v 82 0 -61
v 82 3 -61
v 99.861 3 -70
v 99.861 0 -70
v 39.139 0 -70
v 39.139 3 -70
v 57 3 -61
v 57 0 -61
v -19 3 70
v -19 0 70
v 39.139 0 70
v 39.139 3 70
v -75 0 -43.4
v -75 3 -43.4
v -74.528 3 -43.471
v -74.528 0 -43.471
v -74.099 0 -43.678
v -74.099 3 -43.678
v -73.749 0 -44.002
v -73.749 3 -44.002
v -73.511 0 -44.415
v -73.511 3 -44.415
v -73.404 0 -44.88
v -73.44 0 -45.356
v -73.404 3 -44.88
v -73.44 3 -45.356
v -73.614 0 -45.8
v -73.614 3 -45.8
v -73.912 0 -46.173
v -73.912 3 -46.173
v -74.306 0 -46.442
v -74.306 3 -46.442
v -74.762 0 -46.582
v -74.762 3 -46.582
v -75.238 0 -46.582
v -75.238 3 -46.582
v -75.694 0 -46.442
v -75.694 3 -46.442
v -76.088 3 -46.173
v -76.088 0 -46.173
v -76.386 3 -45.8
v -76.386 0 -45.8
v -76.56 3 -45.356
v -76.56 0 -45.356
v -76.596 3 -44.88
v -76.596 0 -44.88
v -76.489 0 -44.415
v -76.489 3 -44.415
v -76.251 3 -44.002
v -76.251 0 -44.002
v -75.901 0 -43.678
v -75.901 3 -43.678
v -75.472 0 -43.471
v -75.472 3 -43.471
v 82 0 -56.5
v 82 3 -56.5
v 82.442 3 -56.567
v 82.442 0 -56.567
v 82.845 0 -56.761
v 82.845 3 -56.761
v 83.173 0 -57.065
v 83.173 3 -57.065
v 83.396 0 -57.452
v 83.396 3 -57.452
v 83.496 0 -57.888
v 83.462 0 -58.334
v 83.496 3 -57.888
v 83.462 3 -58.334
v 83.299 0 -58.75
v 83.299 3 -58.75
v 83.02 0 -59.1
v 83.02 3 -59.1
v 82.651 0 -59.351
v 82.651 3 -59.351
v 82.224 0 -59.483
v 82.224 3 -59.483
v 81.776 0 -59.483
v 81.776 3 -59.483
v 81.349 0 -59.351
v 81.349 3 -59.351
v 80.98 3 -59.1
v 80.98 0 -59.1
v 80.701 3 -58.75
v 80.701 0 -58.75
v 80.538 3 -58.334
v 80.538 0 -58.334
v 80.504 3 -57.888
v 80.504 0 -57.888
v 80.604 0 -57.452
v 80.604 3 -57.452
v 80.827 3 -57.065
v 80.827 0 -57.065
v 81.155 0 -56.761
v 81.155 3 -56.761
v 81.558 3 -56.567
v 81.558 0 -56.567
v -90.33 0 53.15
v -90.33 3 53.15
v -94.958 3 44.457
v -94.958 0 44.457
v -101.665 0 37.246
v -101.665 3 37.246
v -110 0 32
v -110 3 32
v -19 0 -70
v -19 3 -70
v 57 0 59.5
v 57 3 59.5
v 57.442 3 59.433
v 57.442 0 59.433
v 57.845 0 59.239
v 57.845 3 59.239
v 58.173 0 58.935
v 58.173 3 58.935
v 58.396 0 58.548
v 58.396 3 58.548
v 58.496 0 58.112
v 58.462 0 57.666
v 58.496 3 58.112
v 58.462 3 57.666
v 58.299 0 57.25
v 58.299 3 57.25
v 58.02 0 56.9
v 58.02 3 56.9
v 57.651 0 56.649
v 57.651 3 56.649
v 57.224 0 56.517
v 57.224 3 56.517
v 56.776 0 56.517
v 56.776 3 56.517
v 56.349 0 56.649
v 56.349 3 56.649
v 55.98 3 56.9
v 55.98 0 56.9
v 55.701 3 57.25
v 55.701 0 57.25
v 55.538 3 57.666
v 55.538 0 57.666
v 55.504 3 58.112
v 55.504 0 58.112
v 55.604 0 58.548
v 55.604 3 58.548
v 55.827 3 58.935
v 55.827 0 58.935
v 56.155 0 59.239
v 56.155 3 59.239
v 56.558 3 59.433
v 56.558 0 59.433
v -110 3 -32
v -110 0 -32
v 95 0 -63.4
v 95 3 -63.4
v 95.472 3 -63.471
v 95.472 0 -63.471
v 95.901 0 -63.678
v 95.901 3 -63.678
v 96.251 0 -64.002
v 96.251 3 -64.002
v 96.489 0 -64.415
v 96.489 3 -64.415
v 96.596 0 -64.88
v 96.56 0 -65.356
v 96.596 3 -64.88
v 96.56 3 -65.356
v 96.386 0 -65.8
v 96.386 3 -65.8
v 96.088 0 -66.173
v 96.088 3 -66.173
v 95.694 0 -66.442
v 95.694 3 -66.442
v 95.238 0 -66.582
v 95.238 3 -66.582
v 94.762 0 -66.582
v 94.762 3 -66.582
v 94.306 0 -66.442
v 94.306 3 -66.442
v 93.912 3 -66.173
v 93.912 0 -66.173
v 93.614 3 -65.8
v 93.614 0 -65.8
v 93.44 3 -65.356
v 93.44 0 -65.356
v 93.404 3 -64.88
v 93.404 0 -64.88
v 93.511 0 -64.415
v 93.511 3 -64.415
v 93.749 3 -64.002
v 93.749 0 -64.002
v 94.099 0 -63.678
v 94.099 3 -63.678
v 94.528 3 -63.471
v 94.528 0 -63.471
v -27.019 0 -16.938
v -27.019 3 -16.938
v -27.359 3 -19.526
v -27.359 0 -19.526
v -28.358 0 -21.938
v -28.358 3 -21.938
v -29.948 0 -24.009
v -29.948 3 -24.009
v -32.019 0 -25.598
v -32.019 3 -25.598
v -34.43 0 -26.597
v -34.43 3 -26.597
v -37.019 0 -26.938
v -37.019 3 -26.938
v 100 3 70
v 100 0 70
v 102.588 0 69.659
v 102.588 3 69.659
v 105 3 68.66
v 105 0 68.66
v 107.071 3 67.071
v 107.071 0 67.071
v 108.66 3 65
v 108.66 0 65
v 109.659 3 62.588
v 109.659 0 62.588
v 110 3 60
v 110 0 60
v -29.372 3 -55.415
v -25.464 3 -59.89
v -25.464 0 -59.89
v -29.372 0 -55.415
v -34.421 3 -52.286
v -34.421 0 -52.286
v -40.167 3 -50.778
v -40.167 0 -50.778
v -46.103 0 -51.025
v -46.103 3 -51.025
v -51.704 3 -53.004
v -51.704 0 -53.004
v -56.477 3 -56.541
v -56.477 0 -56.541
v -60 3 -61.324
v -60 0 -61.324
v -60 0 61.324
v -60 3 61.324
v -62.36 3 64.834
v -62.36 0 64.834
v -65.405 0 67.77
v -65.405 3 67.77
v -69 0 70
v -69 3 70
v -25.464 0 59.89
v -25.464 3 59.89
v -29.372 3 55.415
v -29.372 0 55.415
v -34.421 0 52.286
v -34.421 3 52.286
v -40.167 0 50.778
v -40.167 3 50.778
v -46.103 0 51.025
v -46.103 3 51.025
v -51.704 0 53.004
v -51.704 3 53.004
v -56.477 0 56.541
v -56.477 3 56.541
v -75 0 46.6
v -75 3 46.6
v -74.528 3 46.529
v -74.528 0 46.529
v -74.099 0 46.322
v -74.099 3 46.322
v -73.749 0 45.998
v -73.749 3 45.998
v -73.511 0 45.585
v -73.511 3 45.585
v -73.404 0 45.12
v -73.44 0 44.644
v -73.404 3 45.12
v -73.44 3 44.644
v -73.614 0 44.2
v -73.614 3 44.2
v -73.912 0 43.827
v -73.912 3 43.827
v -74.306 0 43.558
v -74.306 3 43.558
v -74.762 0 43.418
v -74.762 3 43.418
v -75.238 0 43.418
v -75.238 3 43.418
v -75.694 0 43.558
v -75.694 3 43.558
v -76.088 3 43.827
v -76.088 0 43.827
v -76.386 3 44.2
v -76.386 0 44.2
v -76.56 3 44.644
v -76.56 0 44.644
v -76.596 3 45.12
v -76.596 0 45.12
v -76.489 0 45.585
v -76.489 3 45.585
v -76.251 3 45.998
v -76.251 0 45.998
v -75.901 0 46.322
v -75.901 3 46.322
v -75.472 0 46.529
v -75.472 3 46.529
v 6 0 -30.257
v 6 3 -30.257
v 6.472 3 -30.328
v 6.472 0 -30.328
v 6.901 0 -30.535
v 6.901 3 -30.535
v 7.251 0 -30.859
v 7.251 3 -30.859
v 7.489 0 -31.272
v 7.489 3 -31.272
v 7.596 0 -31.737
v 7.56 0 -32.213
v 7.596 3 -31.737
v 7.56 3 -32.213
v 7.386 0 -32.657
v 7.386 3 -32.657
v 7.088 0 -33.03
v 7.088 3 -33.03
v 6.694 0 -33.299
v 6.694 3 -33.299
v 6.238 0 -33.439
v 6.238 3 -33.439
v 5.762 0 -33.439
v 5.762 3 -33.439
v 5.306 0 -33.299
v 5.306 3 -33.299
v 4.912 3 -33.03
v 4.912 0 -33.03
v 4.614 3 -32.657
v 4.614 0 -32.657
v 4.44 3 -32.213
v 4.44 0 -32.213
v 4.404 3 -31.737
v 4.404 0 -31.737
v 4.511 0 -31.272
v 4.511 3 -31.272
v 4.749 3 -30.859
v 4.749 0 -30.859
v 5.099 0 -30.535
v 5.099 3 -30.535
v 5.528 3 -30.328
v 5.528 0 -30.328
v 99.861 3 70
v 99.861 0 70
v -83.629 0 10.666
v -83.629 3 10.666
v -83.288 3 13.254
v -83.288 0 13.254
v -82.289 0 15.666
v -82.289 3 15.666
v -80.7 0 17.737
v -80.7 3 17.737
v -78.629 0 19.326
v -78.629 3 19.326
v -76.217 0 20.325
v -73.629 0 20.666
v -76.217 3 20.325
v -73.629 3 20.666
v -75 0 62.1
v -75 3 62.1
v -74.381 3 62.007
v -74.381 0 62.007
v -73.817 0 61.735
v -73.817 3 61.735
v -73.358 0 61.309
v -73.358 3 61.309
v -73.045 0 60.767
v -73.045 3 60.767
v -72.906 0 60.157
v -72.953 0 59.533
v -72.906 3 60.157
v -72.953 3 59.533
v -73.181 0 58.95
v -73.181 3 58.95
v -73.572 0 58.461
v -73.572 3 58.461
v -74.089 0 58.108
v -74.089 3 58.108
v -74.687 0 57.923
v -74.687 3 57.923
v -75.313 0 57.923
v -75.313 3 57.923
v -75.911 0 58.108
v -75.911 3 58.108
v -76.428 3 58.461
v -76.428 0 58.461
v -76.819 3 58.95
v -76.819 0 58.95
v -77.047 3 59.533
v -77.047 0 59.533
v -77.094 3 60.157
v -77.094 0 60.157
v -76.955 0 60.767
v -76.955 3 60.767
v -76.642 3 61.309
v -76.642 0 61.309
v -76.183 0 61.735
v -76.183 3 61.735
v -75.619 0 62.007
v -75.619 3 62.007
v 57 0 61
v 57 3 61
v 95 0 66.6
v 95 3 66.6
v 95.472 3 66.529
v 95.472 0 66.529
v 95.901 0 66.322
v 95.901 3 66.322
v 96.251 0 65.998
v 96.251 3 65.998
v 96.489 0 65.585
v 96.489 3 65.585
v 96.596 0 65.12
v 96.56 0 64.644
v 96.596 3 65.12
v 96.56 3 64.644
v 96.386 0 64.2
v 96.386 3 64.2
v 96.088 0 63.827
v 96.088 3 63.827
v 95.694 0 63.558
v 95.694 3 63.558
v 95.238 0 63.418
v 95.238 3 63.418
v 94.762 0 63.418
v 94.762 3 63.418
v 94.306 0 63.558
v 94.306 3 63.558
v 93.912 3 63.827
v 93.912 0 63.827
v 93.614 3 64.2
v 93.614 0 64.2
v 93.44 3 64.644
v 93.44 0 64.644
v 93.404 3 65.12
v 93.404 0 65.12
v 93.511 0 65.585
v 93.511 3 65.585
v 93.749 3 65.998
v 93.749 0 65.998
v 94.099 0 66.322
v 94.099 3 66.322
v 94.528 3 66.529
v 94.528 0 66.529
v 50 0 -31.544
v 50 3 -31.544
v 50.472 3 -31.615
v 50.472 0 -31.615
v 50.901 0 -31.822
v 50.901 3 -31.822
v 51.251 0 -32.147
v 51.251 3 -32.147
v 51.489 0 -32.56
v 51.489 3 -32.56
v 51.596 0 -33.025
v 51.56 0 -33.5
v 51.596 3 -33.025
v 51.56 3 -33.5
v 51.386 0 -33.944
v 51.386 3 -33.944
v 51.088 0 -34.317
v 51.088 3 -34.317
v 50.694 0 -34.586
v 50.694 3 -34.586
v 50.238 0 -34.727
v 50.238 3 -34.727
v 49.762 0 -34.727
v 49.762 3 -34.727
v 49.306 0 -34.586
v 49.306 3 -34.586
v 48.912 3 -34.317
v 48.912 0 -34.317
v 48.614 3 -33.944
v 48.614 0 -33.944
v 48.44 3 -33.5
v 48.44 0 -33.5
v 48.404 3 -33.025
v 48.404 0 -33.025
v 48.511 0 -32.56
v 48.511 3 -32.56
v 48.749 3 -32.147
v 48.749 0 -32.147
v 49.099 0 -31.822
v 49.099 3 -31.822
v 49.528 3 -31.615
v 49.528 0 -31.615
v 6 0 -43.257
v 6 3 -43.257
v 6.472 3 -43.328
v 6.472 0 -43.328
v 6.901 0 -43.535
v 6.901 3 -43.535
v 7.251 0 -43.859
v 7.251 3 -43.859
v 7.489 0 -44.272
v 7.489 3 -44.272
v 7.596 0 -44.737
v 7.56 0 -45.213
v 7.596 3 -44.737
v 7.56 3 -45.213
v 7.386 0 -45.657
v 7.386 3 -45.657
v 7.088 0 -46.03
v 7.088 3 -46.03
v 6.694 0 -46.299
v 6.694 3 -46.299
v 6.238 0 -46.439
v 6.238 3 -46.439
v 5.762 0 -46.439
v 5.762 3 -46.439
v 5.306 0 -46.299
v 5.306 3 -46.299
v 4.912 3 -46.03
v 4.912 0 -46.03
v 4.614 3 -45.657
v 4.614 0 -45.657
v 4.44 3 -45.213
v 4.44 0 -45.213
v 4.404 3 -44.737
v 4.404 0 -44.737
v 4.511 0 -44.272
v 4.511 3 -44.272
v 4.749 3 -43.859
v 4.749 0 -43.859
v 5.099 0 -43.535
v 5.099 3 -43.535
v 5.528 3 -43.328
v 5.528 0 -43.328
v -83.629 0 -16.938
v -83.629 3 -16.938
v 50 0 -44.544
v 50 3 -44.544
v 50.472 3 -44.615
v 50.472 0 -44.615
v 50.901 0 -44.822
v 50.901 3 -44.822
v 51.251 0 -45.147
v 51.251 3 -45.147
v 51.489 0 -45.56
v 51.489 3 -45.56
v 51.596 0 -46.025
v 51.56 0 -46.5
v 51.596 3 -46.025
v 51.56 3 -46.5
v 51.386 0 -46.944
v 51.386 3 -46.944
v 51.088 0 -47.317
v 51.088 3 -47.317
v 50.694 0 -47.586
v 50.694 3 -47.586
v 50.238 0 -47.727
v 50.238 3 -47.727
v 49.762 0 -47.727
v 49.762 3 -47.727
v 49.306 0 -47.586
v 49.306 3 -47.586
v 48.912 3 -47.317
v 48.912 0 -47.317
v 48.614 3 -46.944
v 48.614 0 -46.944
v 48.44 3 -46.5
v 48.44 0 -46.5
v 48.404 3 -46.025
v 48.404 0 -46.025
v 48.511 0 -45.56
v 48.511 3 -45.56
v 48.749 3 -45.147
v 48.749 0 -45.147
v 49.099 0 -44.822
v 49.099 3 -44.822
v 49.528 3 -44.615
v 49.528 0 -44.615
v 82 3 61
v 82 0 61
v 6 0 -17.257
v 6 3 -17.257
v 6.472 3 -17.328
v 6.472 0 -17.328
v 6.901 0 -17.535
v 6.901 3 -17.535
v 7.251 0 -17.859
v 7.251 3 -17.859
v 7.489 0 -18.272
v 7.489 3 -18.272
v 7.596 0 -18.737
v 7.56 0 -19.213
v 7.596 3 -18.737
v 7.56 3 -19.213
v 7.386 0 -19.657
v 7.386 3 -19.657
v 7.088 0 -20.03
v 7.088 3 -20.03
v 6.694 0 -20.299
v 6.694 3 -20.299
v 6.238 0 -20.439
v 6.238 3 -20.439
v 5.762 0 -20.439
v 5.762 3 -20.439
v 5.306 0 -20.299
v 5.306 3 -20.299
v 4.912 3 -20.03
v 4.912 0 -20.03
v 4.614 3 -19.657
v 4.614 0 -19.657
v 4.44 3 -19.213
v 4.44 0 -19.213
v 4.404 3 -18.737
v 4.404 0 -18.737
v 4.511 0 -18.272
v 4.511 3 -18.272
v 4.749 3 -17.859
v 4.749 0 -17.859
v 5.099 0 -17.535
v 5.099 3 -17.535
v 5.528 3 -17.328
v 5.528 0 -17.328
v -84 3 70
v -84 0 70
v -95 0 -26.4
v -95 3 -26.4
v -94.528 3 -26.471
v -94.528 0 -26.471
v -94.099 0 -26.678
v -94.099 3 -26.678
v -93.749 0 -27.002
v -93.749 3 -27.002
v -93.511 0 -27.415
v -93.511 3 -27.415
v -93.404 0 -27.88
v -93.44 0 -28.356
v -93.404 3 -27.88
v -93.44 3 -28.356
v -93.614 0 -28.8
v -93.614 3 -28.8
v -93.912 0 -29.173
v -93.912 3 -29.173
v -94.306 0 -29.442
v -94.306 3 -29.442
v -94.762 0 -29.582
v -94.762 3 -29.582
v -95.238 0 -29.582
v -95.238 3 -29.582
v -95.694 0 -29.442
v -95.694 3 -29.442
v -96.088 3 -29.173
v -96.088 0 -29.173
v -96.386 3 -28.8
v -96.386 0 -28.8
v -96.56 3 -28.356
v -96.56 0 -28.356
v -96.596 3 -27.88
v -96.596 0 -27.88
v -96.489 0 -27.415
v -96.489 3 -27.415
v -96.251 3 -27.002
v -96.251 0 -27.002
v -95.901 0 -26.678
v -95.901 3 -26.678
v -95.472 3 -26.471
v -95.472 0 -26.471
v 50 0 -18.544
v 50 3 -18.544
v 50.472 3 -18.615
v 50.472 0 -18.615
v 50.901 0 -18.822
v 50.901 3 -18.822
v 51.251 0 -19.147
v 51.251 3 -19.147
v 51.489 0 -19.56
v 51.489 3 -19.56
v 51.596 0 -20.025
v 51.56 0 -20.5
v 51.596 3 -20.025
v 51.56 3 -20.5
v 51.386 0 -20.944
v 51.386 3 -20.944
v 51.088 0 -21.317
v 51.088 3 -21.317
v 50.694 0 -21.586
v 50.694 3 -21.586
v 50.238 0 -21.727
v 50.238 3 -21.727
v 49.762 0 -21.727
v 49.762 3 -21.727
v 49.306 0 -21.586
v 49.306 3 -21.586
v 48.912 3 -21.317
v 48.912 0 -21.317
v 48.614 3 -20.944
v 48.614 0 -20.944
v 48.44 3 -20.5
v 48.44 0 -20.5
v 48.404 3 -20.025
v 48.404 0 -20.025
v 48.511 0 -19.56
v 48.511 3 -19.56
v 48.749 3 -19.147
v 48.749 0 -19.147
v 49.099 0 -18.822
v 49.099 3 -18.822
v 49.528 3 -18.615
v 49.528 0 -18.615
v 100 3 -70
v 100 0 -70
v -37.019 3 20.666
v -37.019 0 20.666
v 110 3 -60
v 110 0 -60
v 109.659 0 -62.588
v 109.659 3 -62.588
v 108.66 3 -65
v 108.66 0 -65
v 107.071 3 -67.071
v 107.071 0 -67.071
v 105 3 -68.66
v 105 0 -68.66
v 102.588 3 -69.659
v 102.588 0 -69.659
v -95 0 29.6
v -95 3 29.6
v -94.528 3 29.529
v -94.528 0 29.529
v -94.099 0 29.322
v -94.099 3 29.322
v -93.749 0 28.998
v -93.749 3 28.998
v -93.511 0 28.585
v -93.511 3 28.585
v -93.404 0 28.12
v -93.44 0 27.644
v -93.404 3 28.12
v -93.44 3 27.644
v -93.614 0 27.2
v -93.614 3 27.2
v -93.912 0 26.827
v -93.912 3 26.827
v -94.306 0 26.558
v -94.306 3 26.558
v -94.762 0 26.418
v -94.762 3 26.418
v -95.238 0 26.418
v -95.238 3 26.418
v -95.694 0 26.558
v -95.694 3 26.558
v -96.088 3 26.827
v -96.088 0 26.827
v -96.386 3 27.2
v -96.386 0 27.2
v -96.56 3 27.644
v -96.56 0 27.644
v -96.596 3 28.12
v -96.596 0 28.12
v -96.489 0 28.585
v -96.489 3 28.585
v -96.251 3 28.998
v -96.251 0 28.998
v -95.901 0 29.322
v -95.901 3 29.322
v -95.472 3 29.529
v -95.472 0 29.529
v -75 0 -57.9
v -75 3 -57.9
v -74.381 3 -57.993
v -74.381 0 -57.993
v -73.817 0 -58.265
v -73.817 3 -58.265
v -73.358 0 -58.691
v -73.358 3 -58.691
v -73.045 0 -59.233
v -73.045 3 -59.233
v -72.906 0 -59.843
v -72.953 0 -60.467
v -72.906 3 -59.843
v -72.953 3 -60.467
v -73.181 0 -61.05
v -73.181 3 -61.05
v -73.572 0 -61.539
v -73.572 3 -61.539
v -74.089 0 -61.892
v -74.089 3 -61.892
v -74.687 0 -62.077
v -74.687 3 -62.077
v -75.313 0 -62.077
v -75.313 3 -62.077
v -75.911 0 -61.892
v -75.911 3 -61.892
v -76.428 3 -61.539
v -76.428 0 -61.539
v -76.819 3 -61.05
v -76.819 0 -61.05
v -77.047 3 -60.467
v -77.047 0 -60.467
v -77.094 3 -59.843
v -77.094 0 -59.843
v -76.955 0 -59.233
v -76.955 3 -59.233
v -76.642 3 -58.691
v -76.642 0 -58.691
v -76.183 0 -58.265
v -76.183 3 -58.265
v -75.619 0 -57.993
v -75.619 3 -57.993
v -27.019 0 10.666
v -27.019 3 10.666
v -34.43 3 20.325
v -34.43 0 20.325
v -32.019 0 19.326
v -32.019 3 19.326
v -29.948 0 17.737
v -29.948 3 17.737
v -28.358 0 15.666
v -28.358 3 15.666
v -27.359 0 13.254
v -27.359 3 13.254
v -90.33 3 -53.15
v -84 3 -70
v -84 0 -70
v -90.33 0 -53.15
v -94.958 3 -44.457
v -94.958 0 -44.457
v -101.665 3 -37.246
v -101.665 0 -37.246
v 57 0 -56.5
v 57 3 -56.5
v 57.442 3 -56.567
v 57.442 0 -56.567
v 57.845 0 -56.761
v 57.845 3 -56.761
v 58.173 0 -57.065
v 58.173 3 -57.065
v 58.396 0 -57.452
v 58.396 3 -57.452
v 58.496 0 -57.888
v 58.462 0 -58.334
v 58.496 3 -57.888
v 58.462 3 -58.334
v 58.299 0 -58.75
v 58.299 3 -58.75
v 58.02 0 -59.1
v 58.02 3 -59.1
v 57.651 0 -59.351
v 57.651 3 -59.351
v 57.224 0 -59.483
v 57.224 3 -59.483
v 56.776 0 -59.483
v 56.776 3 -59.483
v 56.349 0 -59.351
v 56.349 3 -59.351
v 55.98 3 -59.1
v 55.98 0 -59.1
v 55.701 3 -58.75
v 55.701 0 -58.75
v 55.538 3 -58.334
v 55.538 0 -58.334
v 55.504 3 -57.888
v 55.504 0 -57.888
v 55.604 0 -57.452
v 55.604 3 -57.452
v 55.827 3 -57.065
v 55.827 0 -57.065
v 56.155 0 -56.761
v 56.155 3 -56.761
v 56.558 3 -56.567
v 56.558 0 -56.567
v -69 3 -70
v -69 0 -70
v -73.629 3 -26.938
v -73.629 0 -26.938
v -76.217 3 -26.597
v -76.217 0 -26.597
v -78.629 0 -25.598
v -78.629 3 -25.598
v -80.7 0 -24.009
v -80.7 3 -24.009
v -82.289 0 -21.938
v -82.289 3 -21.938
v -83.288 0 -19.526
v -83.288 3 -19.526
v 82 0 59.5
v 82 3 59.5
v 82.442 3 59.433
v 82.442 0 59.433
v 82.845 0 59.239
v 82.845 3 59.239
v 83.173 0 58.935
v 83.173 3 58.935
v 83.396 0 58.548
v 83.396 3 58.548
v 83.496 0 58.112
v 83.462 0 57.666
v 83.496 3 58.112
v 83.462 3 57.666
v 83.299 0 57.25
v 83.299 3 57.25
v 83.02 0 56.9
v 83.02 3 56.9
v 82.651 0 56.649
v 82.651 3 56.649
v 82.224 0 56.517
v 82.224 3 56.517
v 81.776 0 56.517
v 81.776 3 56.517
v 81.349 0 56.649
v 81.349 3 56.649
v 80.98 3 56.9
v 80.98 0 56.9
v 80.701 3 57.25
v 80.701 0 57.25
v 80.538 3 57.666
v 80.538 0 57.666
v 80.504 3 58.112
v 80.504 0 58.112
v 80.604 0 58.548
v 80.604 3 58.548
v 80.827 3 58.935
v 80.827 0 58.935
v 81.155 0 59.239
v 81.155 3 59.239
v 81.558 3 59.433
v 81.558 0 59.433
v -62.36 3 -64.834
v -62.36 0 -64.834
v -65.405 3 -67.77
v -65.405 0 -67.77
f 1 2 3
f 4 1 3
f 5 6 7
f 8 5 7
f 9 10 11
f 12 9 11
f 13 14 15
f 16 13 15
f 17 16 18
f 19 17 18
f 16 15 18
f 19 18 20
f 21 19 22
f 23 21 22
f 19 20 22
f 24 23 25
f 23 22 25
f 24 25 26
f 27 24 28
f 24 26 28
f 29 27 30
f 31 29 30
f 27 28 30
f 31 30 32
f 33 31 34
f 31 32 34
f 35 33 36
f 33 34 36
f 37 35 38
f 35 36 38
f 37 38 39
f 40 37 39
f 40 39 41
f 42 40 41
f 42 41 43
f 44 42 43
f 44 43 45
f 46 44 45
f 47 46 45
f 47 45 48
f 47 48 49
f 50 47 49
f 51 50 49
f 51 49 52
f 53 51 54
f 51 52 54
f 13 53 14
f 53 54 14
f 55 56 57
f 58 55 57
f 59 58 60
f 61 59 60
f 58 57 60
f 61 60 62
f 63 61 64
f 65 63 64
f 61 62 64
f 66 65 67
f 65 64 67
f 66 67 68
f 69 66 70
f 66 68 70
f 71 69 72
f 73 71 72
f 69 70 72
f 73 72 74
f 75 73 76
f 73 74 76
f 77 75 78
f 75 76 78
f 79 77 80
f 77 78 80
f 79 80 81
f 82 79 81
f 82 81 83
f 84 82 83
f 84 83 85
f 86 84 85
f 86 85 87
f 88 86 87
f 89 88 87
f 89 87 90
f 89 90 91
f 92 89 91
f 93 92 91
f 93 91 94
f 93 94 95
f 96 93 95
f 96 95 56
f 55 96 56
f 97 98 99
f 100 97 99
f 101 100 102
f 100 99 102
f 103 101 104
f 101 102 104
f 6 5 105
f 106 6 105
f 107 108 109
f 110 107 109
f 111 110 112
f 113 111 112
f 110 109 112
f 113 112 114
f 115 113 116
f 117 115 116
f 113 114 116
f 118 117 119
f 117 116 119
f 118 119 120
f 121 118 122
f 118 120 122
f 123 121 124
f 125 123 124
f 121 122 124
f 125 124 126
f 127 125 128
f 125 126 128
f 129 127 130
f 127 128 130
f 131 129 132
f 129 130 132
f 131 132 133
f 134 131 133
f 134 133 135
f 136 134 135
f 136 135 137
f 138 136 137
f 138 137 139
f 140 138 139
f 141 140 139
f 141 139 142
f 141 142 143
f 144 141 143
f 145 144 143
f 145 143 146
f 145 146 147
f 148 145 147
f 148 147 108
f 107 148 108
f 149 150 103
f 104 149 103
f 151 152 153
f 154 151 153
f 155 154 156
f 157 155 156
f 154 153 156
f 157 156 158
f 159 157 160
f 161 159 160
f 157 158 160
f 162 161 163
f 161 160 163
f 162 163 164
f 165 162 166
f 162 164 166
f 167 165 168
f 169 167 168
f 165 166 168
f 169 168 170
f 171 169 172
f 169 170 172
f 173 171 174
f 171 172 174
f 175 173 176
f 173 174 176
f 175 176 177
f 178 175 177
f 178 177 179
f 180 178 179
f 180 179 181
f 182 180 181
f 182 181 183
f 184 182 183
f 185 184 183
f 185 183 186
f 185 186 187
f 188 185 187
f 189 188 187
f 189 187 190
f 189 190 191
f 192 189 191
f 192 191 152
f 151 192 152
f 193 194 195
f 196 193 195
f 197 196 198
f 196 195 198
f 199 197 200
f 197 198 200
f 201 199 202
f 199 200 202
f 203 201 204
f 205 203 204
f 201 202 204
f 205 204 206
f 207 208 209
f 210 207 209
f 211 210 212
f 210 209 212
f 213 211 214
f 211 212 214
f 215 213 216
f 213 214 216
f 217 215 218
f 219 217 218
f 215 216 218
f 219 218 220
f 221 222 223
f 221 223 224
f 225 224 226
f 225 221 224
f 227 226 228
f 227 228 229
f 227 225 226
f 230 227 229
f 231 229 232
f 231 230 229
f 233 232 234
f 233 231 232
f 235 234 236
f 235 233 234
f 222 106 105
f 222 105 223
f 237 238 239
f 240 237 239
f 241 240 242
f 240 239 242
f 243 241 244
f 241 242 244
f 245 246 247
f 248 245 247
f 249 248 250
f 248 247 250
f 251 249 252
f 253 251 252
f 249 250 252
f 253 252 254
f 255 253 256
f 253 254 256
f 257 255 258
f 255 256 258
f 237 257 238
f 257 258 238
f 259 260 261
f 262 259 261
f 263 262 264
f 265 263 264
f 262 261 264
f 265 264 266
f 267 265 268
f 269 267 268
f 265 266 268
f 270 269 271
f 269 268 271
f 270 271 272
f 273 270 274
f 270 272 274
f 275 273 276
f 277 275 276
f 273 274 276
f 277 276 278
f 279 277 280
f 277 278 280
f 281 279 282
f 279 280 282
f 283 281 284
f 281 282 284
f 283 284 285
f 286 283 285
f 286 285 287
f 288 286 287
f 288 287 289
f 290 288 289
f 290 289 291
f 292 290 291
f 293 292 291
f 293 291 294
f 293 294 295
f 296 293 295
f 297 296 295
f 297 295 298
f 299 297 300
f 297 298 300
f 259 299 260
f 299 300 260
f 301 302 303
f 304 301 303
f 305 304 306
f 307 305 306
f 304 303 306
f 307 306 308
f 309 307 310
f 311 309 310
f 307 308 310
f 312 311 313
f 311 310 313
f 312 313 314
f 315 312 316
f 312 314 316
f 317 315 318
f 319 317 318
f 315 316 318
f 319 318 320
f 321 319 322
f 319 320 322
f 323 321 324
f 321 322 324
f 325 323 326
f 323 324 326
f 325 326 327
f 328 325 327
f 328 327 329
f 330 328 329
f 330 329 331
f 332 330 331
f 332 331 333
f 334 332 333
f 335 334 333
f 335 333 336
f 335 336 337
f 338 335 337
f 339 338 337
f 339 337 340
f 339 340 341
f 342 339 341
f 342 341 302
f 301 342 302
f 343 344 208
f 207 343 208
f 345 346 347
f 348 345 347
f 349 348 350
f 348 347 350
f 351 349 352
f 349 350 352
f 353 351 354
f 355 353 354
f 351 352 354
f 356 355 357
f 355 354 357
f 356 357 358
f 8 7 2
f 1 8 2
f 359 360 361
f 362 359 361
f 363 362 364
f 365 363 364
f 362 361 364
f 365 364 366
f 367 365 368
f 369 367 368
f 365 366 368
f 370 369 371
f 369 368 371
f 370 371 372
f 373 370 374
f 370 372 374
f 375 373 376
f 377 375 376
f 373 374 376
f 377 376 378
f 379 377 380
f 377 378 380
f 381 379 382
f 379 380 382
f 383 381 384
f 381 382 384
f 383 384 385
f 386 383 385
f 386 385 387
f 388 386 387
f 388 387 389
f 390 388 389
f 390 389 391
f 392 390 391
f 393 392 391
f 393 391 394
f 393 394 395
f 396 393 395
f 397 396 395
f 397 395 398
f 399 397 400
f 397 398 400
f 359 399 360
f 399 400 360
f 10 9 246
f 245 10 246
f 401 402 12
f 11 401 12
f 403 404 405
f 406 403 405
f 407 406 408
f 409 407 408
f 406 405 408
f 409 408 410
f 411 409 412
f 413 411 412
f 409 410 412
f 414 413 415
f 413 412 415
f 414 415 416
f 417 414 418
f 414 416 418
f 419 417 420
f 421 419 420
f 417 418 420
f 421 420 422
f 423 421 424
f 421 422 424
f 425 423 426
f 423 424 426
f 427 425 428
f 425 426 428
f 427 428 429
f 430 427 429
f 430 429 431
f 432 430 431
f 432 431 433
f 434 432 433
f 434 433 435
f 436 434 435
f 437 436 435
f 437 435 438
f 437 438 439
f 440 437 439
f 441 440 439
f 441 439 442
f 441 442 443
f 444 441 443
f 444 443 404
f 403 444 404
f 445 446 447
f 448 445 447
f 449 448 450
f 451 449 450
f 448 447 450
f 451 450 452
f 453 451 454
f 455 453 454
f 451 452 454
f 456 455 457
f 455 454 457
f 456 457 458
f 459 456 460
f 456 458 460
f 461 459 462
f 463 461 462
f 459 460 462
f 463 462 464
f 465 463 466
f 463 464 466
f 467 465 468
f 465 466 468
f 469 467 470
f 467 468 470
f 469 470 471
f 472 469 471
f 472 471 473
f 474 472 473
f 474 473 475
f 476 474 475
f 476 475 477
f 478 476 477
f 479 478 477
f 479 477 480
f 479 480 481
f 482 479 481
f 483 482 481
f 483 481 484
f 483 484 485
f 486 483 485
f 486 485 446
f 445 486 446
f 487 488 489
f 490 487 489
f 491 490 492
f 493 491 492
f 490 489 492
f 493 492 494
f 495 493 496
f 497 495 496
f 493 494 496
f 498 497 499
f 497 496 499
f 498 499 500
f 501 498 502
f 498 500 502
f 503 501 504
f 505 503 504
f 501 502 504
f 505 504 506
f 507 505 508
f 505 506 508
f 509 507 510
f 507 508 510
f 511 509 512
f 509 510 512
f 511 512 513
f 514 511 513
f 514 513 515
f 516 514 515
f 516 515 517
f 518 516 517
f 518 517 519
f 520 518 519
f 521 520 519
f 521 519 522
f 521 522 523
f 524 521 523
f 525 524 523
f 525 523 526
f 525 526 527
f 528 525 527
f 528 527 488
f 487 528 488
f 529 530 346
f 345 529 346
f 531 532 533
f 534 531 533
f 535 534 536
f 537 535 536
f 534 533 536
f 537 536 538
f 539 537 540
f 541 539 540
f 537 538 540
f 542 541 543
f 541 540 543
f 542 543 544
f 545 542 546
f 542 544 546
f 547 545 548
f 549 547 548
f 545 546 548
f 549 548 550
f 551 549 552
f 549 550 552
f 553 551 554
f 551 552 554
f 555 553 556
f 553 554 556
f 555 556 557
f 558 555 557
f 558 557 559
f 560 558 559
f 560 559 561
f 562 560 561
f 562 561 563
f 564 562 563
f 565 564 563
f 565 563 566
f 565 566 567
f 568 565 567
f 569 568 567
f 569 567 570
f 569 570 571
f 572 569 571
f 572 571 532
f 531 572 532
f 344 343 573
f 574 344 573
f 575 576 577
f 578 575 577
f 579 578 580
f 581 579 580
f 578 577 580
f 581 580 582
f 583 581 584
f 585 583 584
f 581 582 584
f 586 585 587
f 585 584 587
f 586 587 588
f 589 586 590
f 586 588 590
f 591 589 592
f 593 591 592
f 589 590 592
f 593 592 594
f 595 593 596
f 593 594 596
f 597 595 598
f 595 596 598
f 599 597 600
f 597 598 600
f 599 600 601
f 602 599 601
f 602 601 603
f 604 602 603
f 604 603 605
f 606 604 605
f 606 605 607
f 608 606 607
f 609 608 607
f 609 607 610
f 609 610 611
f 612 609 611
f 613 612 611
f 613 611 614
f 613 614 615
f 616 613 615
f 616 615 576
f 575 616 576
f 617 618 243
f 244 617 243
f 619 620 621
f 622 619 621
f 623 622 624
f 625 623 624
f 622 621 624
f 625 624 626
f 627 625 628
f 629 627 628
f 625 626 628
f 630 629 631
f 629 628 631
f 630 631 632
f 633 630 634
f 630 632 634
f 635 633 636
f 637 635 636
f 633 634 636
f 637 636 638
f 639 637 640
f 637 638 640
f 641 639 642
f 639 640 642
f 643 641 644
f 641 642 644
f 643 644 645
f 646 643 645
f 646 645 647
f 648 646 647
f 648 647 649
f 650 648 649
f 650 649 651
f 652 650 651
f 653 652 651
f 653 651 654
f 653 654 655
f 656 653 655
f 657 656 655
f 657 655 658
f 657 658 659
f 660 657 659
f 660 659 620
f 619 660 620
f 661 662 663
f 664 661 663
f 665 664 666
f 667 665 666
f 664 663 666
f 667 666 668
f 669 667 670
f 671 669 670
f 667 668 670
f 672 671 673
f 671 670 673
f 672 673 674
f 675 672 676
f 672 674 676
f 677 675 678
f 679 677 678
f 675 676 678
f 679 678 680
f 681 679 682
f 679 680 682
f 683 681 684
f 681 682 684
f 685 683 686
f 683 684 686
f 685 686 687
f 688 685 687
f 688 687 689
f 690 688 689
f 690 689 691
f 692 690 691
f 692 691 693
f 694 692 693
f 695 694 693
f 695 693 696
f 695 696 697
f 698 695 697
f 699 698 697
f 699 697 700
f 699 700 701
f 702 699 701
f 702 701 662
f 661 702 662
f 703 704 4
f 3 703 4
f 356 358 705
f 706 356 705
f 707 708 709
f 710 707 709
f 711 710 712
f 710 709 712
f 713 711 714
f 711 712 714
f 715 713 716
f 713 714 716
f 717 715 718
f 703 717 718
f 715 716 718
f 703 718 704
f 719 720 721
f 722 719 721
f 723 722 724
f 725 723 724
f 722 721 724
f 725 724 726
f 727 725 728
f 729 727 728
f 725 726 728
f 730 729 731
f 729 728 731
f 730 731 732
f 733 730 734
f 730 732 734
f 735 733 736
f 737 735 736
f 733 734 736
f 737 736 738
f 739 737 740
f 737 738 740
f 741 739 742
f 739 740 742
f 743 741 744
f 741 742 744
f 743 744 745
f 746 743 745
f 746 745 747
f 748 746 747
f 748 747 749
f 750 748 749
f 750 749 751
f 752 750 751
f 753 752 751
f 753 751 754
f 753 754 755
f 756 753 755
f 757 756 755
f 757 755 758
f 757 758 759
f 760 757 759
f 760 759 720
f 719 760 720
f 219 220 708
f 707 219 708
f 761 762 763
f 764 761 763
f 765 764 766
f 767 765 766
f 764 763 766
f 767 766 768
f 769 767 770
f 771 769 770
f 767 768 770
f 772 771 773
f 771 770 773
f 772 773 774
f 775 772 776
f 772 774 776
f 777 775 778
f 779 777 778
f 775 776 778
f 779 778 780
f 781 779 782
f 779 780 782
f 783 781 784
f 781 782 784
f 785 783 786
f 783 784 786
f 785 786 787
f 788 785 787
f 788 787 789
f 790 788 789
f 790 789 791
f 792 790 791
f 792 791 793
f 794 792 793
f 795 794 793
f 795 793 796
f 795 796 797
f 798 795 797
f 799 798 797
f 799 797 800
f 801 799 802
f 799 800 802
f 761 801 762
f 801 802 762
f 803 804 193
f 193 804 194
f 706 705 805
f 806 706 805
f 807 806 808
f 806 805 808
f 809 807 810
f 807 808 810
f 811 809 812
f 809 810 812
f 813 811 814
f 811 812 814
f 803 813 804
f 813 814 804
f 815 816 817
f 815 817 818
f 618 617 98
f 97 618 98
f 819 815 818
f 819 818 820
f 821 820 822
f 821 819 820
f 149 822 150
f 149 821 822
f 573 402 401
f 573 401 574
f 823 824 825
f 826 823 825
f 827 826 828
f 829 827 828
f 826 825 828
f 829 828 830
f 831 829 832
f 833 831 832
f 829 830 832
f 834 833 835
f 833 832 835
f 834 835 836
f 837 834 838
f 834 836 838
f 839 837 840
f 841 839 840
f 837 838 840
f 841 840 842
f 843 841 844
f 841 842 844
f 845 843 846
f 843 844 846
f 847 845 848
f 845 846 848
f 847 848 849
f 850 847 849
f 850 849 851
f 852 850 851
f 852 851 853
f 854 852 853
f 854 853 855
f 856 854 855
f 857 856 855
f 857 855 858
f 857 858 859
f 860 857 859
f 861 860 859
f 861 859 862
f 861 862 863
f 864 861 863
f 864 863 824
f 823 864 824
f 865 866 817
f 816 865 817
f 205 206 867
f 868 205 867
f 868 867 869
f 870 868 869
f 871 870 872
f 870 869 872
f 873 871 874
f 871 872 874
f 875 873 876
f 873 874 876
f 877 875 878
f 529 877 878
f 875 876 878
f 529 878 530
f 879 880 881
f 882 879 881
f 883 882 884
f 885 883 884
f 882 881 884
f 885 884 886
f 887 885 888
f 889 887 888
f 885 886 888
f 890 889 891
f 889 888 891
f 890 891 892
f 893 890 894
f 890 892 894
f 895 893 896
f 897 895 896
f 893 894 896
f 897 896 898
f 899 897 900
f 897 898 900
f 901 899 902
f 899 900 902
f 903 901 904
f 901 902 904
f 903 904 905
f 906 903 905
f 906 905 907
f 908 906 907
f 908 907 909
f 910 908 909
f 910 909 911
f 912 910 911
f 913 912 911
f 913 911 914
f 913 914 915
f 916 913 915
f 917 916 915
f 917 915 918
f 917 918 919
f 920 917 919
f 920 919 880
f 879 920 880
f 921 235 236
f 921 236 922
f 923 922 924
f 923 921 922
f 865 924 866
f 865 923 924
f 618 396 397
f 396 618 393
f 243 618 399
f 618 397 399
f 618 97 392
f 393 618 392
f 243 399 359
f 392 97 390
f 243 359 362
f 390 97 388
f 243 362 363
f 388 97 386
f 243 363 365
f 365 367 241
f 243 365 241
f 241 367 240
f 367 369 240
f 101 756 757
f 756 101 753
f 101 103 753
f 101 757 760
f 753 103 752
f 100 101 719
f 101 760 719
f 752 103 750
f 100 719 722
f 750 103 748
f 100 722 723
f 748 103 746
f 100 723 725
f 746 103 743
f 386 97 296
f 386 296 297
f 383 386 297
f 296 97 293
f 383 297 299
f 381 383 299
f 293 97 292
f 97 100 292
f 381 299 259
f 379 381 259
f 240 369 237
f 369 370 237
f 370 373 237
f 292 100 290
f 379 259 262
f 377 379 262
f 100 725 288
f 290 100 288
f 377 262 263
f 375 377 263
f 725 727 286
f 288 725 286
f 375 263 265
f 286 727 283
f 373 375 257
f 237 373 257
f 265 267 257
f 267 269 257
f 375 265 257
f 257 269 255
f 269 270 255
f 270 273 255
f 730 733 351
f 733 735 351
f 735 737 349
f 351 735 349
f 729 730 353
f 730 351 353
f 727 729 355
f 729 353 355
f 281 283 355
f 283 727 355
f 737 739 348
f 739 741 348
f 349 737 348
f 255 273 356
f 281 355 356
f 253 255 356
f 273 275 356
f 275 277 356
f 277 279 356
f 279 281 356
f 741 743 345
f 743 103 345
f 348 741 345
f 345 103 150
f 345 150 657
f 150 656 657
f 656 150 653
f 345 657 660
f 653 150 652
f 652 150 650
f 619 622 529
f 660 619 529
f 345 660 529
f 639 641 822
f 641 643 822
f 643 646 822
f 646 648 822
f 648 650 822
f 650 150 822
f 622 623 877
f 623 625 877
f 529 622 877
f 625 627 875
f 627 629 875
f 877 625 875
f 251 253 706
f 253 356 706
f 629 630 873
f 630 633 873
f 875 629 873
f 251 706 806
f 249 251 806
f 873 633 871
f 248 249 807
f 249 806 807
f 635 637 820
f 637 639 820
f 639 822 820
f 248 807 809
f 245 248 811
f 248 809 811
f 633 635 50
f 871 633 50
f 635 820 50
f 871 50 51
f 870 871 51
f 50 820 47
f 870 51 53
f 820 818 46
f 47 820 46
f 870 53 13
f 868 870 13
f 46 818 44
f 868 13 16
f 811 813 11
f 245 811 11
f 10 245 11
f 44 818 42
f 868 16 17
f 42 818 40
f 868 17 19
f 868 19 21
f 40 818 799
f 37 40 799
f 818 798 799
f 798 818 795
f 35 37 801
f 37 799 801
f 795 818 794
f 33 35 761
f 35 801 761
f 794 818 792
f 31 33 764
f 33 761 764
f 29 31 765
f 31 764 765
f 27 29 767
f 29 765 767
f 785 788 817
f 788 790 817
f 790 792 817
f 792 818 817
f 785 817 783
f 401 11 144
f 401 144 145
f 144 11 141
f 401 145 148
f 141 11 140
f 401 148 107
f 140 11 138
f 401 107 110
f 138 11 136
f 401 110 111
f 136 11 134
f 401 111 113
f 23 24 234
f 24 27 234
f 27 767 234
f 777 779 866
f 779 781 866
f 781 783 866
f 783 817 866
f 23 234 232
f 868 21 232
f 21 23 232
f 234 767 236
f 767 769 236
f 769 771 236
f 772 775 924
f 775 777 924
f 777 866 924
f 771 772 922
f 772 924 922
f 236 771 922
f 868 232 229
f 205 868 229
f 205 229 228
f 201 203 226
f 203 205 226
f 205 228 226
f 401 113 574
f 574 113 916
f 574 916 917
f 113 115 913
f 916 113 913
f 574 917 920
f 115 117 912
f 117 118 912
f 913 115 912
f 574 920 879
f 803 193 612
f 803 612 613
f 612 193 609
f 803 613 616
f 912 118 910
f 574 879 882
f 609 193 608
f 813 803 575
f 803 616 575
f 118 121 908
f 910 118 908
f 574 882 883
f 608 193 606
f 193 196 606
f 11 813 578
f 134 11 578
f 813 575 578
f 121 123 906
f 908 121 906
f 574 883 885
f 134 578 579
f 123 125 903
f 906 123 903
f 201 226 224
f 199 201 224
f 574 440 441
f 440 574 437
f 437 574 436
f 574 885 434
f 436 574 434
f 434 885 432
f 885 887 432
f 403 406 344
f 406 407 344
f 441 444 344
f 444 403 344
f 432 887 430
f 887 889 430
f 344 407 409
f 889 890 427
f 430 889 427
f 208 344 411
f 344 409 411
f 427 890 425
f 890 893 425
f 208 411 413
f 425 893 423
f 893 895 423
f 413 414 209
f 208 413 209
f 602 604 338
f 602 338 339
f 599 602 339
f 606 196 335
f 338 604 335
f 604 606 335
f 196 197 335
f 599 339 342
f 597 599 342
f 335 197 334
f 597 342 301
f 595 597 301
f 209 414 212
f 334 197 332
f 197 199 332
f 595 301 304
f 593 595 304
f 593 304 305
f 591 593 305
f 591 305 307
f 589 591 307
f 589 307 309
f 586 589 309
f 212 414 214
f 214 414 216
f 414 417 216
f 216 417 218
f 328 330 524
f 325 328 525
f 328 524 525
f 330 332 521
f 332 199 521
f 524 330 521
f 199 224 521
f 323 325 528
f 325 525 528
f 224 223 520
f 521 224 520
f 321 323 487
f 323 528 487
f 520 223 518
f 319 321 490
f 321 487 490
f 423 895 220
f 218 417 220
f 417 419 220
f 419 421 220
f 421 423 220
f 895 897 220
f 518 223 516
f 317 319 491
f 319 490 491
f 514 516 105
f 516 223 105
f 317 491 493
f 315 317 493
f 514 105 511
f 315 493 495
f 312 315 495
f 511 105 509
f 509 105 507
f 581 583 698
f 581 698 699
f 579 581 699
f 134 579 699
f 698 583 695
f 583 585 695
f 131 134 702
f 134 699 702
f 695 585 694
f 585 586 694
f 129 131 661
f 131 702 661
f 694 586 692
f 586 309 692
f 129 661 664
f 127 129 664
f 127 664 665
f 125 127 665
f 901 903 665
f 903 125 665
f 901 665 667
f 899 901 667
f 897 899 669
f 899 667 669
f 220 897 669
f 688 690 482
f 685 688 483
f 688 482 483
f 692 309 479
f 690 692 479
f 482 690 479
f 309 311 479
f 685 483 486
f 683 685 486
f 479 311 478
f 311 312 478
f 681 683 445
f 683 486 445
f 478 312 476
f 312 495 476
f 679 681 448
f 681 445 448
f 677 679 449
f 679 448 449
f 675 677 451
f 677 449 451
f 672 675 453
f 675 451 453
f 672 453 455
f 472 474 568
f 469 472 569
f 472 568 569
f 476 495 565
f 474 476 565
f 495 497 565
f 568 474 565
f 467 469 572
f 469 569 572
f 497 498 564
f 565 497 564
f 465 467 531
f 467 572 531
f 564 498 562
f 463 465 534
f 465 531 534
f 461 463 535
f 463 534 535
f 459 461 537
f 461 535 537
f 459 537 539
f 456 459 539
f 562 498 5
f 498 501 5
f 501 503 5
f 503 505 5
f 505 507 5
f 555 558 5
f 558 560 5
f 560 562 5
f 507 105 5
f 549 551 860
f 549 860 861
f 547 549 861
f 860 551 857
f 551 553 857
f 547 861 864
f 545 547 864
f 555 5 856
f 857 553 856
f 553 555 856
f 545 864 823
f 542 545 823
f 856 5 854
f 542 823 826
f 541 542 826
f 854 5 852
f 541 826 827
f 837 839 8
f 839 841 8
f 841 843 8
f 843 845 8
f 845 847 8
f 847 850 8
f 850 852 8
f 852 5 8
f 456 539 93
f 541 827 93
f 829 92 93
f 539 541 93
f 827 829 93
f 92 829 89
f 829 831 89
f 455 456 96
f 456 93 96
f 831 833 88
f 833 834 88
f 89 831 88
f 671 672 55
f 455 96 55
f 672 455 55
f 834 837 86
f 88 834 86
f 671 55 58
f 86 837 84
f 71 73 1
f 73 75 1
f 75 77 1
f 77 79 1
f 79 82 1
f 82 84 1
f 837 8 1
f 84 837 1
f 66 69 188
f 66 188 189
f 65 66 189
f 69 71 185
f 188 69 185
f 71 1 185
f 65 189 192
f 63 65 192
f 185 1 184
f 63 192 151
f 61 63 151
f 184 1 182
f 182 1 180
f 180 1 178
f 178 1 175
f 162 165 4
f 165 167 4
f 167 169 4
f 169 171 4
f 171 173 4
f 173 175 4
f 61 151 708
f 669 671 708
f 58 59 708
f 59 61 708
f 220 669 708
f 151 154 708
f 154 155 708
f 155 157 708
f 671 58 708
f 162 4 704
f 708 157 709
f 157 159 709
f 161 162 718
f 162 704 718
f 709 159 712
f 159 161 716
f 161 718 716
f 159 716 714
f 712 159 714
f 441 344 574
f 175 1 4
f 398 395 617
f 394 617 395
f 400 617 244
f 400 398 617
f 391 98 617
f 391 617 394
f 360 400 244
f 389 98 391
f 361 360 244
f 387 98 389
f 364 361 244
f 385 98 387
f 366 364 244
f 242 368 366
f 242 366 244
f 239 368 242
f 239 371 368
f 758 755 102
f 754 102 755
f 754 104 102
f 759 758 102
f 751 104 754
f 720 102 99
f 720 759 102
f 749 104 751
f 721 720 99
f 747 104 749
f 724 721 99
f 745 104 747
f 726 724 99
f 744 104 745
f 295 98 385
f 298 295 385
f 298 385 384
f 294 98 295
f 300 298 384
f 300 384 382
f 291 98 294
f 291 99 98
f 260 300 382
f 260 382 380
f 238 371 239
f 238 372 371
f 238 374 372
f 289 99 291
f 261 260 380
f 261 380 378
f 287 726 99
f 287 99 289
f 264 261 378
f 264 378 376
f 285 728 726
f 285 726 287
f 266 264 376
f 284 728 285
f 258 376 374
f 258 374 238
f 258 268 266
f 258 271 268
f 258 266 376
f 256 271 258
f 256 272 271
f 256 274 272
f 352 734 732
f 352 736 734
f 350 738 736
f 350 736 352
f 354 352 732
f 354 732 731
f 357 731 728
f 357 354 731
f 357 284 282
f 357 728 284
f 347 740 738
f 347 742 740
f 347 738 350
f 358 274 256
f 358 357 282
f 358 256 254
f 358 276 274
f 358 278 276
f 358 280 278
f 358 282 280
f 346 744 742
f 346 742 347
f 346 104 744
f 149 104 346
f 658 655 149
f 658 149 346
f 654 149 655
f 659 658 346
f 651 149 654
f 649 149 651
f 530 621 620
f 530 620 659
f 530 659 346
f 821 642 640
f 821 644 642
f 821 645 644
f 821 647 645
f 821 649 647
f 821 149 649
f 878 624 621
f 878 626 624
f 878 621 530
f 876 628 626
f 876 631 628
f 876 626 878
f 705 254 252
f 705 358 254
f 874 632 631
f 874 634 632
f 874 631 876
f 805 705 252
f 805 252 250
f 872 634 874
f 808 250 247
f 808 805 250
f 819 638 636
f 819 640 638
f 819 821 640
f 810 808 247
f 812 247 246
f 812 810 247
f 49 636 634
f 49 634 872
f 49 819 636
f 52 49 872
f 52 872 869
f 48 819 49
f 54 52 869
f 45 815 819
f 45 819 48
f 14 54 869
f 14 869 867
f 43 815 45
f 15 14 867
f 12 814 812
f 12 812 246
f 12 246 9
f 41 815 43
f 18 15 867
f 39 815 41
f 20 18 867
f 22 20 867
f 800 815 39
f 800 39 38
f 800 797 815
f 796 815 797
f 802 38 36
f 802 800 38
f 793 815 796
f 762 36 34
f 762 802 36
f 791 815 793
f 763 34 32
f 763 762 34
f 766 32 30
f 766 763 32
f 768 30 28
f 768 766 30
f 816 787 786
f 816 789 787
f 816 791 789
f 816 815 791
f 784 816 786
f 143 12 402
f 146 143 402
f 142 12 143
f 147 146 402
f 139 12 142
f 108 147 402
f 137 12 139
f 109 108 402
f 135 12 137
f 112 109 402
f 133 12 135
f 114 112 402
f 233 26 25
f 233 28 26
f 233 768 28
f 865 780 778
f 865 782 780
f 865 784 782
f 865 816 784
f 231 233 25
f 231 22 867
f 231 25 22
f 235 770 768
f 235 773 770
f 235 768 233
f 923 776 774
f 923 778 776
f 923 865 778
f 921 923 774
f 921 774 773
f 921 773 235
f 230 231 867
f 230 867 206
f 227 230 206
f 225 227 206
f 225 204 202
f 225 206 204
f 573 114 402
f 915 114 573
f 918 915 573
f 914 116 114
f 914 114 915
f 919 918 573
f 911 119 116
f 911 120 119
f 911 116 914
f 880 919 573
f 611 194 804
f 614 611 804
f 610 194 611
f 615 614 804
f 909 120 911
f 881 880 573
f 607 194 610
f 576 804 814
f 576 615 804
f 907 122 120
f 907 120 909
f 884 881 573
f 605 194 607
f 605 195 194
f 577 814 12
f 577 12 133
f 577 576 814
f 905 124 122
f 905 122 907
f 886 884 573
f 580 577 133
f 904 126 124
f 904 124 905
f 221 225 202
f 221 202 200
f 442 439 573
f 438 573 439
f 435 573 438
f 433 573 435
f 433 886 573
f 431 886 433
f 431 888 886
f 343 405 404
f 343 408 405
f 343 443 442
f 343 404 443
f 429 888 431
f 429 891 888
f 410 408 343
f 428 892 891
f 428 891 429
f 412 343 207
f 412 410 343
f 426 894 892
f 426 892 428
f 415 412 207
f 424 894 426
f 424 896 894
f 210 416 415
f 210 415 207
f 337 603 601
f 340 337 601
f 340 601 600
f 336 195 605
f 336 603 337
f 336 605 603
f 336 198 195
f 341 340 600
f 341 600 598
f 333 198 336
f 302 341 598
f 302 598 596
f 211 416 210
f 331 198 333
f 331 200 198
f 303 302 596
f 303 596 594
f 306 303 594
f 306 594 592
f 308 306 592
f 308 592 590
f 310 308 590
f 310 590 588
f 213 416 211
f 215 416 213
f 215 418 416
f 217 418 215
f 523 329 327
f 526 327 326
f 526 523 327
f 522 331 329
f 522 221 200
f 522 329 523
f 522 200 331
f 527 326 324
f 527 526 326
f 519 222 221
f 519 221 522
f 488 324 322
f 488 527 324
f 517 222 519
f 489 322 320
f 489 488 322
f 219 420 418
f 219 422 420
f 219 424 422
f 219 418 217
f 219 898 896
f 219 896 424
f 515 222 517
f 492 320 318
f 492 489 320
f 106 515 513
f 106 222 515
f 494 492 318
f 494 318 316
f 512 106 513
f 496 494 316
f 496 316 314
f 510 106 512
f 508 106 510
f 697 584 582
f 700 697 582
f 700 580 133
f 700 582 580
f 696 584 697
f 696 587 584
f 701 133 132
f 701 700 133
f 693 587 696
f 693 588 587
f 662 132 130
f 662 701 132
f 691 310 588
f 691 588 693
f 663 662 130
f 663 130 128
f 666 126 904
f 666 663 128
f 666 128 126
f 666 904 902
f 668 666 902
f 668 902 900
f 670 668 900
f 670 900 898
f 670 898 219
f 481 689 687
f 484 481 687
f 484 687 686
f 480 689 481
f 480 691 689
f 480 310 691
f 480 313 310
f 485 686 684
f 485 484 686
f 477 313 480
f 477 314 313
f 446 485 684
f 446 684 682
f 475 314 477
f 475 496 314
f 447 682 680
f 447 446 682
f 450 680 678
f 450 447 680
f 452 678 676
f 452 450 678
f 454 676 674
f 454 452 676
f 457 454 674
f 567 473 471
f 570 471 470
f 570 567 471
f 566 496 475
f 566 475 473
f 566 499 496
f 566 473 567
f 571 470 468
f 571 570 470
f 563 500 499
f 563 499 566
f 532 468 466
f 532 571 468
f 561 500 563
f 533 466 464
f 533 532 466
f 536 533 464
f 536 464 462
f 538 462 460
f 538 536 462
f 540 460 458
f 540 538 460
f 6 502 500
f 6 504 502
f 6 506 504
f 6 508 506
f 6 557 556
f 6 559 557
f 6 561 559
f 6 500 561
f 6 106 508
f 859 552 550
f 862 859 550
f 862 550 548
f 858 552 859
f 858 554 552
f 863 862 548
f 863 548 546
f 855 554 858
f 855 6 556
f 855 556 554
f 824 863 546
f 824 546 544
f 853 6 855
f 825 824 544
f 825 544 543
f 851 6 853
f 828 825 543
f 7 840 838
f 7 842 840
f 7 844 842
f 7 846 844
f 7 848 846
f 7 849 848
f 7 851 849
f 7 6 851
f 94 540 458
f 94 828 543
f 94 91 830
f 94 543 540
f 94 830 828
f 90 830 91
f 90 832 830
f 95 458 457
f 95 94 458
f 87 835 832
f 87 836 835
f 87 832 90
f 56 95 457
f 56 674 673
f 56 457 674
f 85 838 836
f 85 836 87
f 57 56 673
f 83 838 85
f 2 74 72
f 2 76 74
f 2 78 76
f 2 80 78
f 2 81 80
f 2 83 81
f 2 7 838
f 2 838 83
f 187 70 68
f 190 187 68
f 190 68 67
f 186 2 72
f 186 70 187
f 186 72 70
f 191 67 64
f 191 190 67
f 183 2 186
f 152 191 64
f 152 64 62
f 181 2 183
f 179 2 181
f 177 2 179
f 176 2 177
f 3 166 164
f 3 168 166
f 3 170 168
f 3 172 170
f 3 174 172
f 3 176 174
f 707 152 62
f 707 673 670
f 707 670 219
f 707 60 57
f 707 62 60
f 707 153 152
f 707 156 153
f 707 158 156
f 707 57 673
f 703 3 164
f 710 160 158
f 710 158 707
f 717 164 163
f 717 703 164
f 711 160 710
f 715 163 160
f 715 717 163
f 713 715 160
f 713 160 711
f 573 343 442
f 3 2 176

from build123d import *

# Parameters (mm, degrees)
Y_KSEKLIK_EKSTR_ZYON3_DEPTH = 3
KES_EKSTR_ZYON10_DEPTH      = 3
KES_EKSTR_ZYON11_DEPTH      = 3
KES_EKSTR_ZYON14_DEPTH      = 3
KES_EKSTR_ZYON15_DEPTH      = 3
IZIM25_R                    = 1.6
KES_EKSTR_ZYON16_DEPTH      = 10
IZIM33_R                    = 2.1
IZIM33_R_2                  = 1.6
KES_EKSTR_ZYON18_DEPTH      = 3
IZIM34_R                    = 1.6
KES_EKSTR_ZYON19_DEPTH      = 10
KES_EKSTR_ZYON21_DEPTH      = 10
IZIM38_R                    = 1.5
KES_EKSTR_ZYON22_DEPTH      = 10
IZIM39_W                    = 25
IZIM39_H                    = 9
KES_EKSTR_ZYON23_DEPTH      = 10
IZIM40_R                    = 1.6
KES_EKSTR_ZYON24_DEPTH      = 100


with BuildPart() as part:
    # Çizim16 → Yükseklik-Ekstrüzyon3 (new body)
    with BuildSketch(Plane(origin=(0, 0, 0), x_dir=(1, 0, 0), z_dir=(0, 1, 0))):
        with BuildLine():
            Line((-110, -70), (100, -70))
            ThreePointArc((100, -70), (107.071067812, -67.071067812), (110, -60))
            Line((110, -60), (110, 60))
            ThreePointArc((110, 60), (107.071067812, 67.071067812), (100, 70))
            Line((100, 70), (-110, 70))
            Line((-110, 70), (-110, -70))
        make_face()
    extrude(amount=Y_KSEKLIK_EKSTR_ZYON3_DEPTH)

    # Çizim18 → Kes-Ekstrüzyon10 (cut)
    with BuildSketch(Plane(origin=(0, 3, 0), x_dir=(1, 0, 0), z_dir=(0, 1, 0))):
        with BuildLine():
            Line((-19, 70), (-25.463821511, 59.889658192))
            ThreePointArc((-25.463821511, 59.889658192), (-43.144058736, 50.67991016), (-60, 61.323569832))
            ThreePointArc((-60, 61.323569832), (-63.804672609, 66.383043129), (-69, 70))
            Line((-69, 70), (-19, 70))
        make_face()
    extrude(amount=-KES_EKSTR_ZYON10_DEPTH, mode=Mode.SUBTRACT)

    # Çizim19 → Kes-Ekstrüzyon11 (cut)
    with BuildSketch(Plane(origin=(0, 3, 0), x_dir=(1, 0, 0), z_dir=(0, 1, 0))):
        with BuildLine():
            Line((-19, -70), (-25.463821511, -59.889658192))
            ThreePointArc((-25.463821511, -59.889658192), (-43.144058736, -50.67991016), (-60, -61.323569832))
            ThreePointArc((-60, -61.323569832), (-63.804672609, -66.383043129), (-69, -70))
            Line((-69, -70), (-19, -70))
        make_face()
    extrude(amount=-KES_EKSTR_ZYON11_DEPTH, mode=Mode.SUBTRACT)

    # Çizim23 → Kes-Ekstrüzyon14 (cut)
    with BuildSketch(Plane(origin=(0, 3, 0), x_dir=(1, 0, 0), z_dir=(0, 1, 0))):
        with BuildLine():
            Line((-84, -70), (-90.329717397, -53.149638649))
            ThreePointArc((-90.329717397, -53.149638649), (-98.077113424, -40.633105793), (-110, -32))
            Line((-110, -32), (-110, -70))
            Line((-110, -70), (-84, -70))
        make_face()
    extrude(amount=-KES_EKSTR_ZYON14_DEPTH, mode=Mode.SUBTRACT)

    # Çizim24 → Kes-Ekstrüzyon15 (cut)
    with BuildSketch(Plane(origin=(0, 3, 0), x_dir=(1, 0, 0), z_dir=(0, 1, 0))):
        with BuildLine():
            Line((-84, 70), (-90.329717397, 53.149638649))
            ThreePointArc((-90.329717397, 53.149638649), (-98.077113424, 40.633105793), (-110, 32))
            Line((-110, 32), (-110, 70))
            Line((-110, 70), (-84, 70))
        make_face()
    extrude(amount=-KES_EKSTR_ZYON15_DEPTH, mode=Mode.SUBTRACT)

    # Çizim25 → Kes-Ekstrüzyon16 (cut)
    with BuildSketch(Plane(origin=(0, 3, 0), x_dir=(1, 0, 0), z_dir=(0, 1, 0))):
        with Locations(Location((-95, 28, 0), (0, 0, 270))):
            Circle(IZIM25_R)
        with Locations(Location((-95, -28, 0), (0, 0, 270))):
            Circle(IZIM25_R)
    extrude(amount=-KES_EKSTR_ZYON16_DEPTH, mode=Mode.SUBTRACT)

    # Çizim33 → Kes-Ekstrüzyon18 (cut)
    with BuildSketch(Plane(origin=(0, 3, 0), x_dir=(1, 0, 0), z_dir=(0, 1, 0))):
        with Locations(Location((-75, -60, 0), (0, 0, 270))):
            Circle(IZIM33_R)
        with Locations(Location((-75, 60, 0), (0, 0, 270))):
            Circle(IZIM33_R)
        with Locations(Location((-75, 45, 0), (0, 0, 270))):
            Circle(IZIM33_R_2)
        with Locations(Location((-75, -45, 0), (0, 0, 270))):
            Circle(IZIM33_R_2)
    extrude(amount=-KES_EKSTR_ZYON18_DEPTH, mode=Mode.SUBTRACT)

    # Çizim34 → Kes-Ekstrüzyon19 (cut)
    with BuildSketch(Plane(origin=(0, 3, 0), x_dir=(1, 0, 0), z_dir=(0, 1, 0))):
        with Locations(Location((95, -65, 0), (0, 0, 270))):
            Circle(IZIM34_R)
        with Locations(Location((95, 65, 0), (0, 0, 270))):
            Circle(IZIM34_R)
    extrude(amount=-KES_EKSTR_ZYON19_DEPTH, mode=Mode.SUBTRACT)

    # Çizim37 → Kes-Ekstrüzyon21 (cut)
    with BuildSketch(Plane(origin=(0, 3, 0), x_dir=(1, 0, 0), z_dir=(0, 1, 0))):
        with BuildLine():
            Line((-73.628967409, -20.666004446), (-37.018589471, -20.666004446))
            ThreePointArc((-37.018589471, -20.666004446), (-29.947521659, -17.737072258), (-27.018589471, -10.666004446))
            Line((-27.018589471, -10.666004446), (-27.018589471, 16.938177002))
            ThreePointArc((-27.018589471, 16.938177002), (-29.947521659, 24.009244814), (-37.018589471, 26.938177002))
            Line((-37.018589471, 26.938177002), (-73.628967409, 26.938177002))
            ThreePointArc((-73.628967409, 26.938177002), (-80.700035221, 24.009244814), (-83.628967409, 16.938177002))
            Line((-83.628967409, 16.938177002), (-83.628967409, -10.666004446))
            ThreePointArc((-83.628967409, -10.666004446), (-80.700035221, -17.737072258), (-73.628967409, -20.666004446))
        make_face()
    extrude(amount=-KES_EKSTR_ZYON21_DEPTH, mode=Mode.SUBTRACT)

    # Çizim38 → Kes-Ekstrüzyon22 (cut)
    with BuildSketch(Plane(origin=(0, 3, 0), x_dir=(1, 0, 0), z_dir=(0, 1, 0))):
        with Locations(Location((57, -58, 0), (0, 0, 270))):
            Circle(IZIM38_R)
        with Locations(Location((82, -58, 0), (0, 0, 270))):
            Circle(IZIM38_R)
        with Locations(Location((57, 58, 0), (0, 0, 270))):
            Circle(IZIM38_R)
        with Locations(Location((82, 58, 0), (0, 0, 270))):
            Circle(IZIM38_R)
    extrude(amount=-KES_EKSTR_ZYON22_DEPTH, mode=Mode.SUBTRACT)

    # Çizim39 → Kes-Ekstrüzyon23 (cut)
    with BuildSketch(Plane(origin=(0, 3, 0), x_dir=(1, 0, 0), z_dir=(0, 1, 0))):
        with Locations((69.5, -65.5)):
            Rectangle(IZIM39_W, IZIM39_H)
        Polygon((57, -70), (57, -61), (39.139428901, -70), align=None)
        Polygon((99.860571099, -70), (82, -61), (82, -70), align=None)
        Polygon((57, 61), (57, 70), (39.139428901, 70), align=None)
        with Locations((69.5, 65.5)):
            Rectangle(IZIM39_W, IZIM39_H)
        Polygon((99.860571099, 70), (82, 70), (82, 61), align=None)
    extrude(amount=-KES_EKSTR_ZYON23_DEPTH, mode=Mode.SUBTRACT)

    # Çizim40 → Kes-Ekstrüzyon24 (cut)
    with BuildSketch(Plane(origin=(0, 3, 0), x_dir=(-1, 0, 0), z_dir=(0, 1, 0))):
        with Locations(Location((-6, -44.857008165, 0), (0, 0, 90))):
            Circle(IZIM40_R)
        with Locations(Location((-50, -46.144414684, 0), (0, 0, 90))):
            Circle(IZIM40_R)
        with Locations(Location((-50, -33.144414684, 0), (0, 0, 90))):
            Circle(IZIM40_R)
        with Locations(Location((-6, -31.857008165, 0), (0, 0, 90))):
            Circle(IZIM40_R)
        with Locations(Location((-50, -20.144414684, 0), (0, 0, 90))):
            Circle(IZIM40_R)
        with Locations(Location((-6, -18.857008165, 0), (0, 0, 90))):
            Circle(IZIM40_R)
    extrude(amount=-KES_EKSTR_ZYON24_DEPTH, mode=Mode.SUBTRACT)


solid = part.part
